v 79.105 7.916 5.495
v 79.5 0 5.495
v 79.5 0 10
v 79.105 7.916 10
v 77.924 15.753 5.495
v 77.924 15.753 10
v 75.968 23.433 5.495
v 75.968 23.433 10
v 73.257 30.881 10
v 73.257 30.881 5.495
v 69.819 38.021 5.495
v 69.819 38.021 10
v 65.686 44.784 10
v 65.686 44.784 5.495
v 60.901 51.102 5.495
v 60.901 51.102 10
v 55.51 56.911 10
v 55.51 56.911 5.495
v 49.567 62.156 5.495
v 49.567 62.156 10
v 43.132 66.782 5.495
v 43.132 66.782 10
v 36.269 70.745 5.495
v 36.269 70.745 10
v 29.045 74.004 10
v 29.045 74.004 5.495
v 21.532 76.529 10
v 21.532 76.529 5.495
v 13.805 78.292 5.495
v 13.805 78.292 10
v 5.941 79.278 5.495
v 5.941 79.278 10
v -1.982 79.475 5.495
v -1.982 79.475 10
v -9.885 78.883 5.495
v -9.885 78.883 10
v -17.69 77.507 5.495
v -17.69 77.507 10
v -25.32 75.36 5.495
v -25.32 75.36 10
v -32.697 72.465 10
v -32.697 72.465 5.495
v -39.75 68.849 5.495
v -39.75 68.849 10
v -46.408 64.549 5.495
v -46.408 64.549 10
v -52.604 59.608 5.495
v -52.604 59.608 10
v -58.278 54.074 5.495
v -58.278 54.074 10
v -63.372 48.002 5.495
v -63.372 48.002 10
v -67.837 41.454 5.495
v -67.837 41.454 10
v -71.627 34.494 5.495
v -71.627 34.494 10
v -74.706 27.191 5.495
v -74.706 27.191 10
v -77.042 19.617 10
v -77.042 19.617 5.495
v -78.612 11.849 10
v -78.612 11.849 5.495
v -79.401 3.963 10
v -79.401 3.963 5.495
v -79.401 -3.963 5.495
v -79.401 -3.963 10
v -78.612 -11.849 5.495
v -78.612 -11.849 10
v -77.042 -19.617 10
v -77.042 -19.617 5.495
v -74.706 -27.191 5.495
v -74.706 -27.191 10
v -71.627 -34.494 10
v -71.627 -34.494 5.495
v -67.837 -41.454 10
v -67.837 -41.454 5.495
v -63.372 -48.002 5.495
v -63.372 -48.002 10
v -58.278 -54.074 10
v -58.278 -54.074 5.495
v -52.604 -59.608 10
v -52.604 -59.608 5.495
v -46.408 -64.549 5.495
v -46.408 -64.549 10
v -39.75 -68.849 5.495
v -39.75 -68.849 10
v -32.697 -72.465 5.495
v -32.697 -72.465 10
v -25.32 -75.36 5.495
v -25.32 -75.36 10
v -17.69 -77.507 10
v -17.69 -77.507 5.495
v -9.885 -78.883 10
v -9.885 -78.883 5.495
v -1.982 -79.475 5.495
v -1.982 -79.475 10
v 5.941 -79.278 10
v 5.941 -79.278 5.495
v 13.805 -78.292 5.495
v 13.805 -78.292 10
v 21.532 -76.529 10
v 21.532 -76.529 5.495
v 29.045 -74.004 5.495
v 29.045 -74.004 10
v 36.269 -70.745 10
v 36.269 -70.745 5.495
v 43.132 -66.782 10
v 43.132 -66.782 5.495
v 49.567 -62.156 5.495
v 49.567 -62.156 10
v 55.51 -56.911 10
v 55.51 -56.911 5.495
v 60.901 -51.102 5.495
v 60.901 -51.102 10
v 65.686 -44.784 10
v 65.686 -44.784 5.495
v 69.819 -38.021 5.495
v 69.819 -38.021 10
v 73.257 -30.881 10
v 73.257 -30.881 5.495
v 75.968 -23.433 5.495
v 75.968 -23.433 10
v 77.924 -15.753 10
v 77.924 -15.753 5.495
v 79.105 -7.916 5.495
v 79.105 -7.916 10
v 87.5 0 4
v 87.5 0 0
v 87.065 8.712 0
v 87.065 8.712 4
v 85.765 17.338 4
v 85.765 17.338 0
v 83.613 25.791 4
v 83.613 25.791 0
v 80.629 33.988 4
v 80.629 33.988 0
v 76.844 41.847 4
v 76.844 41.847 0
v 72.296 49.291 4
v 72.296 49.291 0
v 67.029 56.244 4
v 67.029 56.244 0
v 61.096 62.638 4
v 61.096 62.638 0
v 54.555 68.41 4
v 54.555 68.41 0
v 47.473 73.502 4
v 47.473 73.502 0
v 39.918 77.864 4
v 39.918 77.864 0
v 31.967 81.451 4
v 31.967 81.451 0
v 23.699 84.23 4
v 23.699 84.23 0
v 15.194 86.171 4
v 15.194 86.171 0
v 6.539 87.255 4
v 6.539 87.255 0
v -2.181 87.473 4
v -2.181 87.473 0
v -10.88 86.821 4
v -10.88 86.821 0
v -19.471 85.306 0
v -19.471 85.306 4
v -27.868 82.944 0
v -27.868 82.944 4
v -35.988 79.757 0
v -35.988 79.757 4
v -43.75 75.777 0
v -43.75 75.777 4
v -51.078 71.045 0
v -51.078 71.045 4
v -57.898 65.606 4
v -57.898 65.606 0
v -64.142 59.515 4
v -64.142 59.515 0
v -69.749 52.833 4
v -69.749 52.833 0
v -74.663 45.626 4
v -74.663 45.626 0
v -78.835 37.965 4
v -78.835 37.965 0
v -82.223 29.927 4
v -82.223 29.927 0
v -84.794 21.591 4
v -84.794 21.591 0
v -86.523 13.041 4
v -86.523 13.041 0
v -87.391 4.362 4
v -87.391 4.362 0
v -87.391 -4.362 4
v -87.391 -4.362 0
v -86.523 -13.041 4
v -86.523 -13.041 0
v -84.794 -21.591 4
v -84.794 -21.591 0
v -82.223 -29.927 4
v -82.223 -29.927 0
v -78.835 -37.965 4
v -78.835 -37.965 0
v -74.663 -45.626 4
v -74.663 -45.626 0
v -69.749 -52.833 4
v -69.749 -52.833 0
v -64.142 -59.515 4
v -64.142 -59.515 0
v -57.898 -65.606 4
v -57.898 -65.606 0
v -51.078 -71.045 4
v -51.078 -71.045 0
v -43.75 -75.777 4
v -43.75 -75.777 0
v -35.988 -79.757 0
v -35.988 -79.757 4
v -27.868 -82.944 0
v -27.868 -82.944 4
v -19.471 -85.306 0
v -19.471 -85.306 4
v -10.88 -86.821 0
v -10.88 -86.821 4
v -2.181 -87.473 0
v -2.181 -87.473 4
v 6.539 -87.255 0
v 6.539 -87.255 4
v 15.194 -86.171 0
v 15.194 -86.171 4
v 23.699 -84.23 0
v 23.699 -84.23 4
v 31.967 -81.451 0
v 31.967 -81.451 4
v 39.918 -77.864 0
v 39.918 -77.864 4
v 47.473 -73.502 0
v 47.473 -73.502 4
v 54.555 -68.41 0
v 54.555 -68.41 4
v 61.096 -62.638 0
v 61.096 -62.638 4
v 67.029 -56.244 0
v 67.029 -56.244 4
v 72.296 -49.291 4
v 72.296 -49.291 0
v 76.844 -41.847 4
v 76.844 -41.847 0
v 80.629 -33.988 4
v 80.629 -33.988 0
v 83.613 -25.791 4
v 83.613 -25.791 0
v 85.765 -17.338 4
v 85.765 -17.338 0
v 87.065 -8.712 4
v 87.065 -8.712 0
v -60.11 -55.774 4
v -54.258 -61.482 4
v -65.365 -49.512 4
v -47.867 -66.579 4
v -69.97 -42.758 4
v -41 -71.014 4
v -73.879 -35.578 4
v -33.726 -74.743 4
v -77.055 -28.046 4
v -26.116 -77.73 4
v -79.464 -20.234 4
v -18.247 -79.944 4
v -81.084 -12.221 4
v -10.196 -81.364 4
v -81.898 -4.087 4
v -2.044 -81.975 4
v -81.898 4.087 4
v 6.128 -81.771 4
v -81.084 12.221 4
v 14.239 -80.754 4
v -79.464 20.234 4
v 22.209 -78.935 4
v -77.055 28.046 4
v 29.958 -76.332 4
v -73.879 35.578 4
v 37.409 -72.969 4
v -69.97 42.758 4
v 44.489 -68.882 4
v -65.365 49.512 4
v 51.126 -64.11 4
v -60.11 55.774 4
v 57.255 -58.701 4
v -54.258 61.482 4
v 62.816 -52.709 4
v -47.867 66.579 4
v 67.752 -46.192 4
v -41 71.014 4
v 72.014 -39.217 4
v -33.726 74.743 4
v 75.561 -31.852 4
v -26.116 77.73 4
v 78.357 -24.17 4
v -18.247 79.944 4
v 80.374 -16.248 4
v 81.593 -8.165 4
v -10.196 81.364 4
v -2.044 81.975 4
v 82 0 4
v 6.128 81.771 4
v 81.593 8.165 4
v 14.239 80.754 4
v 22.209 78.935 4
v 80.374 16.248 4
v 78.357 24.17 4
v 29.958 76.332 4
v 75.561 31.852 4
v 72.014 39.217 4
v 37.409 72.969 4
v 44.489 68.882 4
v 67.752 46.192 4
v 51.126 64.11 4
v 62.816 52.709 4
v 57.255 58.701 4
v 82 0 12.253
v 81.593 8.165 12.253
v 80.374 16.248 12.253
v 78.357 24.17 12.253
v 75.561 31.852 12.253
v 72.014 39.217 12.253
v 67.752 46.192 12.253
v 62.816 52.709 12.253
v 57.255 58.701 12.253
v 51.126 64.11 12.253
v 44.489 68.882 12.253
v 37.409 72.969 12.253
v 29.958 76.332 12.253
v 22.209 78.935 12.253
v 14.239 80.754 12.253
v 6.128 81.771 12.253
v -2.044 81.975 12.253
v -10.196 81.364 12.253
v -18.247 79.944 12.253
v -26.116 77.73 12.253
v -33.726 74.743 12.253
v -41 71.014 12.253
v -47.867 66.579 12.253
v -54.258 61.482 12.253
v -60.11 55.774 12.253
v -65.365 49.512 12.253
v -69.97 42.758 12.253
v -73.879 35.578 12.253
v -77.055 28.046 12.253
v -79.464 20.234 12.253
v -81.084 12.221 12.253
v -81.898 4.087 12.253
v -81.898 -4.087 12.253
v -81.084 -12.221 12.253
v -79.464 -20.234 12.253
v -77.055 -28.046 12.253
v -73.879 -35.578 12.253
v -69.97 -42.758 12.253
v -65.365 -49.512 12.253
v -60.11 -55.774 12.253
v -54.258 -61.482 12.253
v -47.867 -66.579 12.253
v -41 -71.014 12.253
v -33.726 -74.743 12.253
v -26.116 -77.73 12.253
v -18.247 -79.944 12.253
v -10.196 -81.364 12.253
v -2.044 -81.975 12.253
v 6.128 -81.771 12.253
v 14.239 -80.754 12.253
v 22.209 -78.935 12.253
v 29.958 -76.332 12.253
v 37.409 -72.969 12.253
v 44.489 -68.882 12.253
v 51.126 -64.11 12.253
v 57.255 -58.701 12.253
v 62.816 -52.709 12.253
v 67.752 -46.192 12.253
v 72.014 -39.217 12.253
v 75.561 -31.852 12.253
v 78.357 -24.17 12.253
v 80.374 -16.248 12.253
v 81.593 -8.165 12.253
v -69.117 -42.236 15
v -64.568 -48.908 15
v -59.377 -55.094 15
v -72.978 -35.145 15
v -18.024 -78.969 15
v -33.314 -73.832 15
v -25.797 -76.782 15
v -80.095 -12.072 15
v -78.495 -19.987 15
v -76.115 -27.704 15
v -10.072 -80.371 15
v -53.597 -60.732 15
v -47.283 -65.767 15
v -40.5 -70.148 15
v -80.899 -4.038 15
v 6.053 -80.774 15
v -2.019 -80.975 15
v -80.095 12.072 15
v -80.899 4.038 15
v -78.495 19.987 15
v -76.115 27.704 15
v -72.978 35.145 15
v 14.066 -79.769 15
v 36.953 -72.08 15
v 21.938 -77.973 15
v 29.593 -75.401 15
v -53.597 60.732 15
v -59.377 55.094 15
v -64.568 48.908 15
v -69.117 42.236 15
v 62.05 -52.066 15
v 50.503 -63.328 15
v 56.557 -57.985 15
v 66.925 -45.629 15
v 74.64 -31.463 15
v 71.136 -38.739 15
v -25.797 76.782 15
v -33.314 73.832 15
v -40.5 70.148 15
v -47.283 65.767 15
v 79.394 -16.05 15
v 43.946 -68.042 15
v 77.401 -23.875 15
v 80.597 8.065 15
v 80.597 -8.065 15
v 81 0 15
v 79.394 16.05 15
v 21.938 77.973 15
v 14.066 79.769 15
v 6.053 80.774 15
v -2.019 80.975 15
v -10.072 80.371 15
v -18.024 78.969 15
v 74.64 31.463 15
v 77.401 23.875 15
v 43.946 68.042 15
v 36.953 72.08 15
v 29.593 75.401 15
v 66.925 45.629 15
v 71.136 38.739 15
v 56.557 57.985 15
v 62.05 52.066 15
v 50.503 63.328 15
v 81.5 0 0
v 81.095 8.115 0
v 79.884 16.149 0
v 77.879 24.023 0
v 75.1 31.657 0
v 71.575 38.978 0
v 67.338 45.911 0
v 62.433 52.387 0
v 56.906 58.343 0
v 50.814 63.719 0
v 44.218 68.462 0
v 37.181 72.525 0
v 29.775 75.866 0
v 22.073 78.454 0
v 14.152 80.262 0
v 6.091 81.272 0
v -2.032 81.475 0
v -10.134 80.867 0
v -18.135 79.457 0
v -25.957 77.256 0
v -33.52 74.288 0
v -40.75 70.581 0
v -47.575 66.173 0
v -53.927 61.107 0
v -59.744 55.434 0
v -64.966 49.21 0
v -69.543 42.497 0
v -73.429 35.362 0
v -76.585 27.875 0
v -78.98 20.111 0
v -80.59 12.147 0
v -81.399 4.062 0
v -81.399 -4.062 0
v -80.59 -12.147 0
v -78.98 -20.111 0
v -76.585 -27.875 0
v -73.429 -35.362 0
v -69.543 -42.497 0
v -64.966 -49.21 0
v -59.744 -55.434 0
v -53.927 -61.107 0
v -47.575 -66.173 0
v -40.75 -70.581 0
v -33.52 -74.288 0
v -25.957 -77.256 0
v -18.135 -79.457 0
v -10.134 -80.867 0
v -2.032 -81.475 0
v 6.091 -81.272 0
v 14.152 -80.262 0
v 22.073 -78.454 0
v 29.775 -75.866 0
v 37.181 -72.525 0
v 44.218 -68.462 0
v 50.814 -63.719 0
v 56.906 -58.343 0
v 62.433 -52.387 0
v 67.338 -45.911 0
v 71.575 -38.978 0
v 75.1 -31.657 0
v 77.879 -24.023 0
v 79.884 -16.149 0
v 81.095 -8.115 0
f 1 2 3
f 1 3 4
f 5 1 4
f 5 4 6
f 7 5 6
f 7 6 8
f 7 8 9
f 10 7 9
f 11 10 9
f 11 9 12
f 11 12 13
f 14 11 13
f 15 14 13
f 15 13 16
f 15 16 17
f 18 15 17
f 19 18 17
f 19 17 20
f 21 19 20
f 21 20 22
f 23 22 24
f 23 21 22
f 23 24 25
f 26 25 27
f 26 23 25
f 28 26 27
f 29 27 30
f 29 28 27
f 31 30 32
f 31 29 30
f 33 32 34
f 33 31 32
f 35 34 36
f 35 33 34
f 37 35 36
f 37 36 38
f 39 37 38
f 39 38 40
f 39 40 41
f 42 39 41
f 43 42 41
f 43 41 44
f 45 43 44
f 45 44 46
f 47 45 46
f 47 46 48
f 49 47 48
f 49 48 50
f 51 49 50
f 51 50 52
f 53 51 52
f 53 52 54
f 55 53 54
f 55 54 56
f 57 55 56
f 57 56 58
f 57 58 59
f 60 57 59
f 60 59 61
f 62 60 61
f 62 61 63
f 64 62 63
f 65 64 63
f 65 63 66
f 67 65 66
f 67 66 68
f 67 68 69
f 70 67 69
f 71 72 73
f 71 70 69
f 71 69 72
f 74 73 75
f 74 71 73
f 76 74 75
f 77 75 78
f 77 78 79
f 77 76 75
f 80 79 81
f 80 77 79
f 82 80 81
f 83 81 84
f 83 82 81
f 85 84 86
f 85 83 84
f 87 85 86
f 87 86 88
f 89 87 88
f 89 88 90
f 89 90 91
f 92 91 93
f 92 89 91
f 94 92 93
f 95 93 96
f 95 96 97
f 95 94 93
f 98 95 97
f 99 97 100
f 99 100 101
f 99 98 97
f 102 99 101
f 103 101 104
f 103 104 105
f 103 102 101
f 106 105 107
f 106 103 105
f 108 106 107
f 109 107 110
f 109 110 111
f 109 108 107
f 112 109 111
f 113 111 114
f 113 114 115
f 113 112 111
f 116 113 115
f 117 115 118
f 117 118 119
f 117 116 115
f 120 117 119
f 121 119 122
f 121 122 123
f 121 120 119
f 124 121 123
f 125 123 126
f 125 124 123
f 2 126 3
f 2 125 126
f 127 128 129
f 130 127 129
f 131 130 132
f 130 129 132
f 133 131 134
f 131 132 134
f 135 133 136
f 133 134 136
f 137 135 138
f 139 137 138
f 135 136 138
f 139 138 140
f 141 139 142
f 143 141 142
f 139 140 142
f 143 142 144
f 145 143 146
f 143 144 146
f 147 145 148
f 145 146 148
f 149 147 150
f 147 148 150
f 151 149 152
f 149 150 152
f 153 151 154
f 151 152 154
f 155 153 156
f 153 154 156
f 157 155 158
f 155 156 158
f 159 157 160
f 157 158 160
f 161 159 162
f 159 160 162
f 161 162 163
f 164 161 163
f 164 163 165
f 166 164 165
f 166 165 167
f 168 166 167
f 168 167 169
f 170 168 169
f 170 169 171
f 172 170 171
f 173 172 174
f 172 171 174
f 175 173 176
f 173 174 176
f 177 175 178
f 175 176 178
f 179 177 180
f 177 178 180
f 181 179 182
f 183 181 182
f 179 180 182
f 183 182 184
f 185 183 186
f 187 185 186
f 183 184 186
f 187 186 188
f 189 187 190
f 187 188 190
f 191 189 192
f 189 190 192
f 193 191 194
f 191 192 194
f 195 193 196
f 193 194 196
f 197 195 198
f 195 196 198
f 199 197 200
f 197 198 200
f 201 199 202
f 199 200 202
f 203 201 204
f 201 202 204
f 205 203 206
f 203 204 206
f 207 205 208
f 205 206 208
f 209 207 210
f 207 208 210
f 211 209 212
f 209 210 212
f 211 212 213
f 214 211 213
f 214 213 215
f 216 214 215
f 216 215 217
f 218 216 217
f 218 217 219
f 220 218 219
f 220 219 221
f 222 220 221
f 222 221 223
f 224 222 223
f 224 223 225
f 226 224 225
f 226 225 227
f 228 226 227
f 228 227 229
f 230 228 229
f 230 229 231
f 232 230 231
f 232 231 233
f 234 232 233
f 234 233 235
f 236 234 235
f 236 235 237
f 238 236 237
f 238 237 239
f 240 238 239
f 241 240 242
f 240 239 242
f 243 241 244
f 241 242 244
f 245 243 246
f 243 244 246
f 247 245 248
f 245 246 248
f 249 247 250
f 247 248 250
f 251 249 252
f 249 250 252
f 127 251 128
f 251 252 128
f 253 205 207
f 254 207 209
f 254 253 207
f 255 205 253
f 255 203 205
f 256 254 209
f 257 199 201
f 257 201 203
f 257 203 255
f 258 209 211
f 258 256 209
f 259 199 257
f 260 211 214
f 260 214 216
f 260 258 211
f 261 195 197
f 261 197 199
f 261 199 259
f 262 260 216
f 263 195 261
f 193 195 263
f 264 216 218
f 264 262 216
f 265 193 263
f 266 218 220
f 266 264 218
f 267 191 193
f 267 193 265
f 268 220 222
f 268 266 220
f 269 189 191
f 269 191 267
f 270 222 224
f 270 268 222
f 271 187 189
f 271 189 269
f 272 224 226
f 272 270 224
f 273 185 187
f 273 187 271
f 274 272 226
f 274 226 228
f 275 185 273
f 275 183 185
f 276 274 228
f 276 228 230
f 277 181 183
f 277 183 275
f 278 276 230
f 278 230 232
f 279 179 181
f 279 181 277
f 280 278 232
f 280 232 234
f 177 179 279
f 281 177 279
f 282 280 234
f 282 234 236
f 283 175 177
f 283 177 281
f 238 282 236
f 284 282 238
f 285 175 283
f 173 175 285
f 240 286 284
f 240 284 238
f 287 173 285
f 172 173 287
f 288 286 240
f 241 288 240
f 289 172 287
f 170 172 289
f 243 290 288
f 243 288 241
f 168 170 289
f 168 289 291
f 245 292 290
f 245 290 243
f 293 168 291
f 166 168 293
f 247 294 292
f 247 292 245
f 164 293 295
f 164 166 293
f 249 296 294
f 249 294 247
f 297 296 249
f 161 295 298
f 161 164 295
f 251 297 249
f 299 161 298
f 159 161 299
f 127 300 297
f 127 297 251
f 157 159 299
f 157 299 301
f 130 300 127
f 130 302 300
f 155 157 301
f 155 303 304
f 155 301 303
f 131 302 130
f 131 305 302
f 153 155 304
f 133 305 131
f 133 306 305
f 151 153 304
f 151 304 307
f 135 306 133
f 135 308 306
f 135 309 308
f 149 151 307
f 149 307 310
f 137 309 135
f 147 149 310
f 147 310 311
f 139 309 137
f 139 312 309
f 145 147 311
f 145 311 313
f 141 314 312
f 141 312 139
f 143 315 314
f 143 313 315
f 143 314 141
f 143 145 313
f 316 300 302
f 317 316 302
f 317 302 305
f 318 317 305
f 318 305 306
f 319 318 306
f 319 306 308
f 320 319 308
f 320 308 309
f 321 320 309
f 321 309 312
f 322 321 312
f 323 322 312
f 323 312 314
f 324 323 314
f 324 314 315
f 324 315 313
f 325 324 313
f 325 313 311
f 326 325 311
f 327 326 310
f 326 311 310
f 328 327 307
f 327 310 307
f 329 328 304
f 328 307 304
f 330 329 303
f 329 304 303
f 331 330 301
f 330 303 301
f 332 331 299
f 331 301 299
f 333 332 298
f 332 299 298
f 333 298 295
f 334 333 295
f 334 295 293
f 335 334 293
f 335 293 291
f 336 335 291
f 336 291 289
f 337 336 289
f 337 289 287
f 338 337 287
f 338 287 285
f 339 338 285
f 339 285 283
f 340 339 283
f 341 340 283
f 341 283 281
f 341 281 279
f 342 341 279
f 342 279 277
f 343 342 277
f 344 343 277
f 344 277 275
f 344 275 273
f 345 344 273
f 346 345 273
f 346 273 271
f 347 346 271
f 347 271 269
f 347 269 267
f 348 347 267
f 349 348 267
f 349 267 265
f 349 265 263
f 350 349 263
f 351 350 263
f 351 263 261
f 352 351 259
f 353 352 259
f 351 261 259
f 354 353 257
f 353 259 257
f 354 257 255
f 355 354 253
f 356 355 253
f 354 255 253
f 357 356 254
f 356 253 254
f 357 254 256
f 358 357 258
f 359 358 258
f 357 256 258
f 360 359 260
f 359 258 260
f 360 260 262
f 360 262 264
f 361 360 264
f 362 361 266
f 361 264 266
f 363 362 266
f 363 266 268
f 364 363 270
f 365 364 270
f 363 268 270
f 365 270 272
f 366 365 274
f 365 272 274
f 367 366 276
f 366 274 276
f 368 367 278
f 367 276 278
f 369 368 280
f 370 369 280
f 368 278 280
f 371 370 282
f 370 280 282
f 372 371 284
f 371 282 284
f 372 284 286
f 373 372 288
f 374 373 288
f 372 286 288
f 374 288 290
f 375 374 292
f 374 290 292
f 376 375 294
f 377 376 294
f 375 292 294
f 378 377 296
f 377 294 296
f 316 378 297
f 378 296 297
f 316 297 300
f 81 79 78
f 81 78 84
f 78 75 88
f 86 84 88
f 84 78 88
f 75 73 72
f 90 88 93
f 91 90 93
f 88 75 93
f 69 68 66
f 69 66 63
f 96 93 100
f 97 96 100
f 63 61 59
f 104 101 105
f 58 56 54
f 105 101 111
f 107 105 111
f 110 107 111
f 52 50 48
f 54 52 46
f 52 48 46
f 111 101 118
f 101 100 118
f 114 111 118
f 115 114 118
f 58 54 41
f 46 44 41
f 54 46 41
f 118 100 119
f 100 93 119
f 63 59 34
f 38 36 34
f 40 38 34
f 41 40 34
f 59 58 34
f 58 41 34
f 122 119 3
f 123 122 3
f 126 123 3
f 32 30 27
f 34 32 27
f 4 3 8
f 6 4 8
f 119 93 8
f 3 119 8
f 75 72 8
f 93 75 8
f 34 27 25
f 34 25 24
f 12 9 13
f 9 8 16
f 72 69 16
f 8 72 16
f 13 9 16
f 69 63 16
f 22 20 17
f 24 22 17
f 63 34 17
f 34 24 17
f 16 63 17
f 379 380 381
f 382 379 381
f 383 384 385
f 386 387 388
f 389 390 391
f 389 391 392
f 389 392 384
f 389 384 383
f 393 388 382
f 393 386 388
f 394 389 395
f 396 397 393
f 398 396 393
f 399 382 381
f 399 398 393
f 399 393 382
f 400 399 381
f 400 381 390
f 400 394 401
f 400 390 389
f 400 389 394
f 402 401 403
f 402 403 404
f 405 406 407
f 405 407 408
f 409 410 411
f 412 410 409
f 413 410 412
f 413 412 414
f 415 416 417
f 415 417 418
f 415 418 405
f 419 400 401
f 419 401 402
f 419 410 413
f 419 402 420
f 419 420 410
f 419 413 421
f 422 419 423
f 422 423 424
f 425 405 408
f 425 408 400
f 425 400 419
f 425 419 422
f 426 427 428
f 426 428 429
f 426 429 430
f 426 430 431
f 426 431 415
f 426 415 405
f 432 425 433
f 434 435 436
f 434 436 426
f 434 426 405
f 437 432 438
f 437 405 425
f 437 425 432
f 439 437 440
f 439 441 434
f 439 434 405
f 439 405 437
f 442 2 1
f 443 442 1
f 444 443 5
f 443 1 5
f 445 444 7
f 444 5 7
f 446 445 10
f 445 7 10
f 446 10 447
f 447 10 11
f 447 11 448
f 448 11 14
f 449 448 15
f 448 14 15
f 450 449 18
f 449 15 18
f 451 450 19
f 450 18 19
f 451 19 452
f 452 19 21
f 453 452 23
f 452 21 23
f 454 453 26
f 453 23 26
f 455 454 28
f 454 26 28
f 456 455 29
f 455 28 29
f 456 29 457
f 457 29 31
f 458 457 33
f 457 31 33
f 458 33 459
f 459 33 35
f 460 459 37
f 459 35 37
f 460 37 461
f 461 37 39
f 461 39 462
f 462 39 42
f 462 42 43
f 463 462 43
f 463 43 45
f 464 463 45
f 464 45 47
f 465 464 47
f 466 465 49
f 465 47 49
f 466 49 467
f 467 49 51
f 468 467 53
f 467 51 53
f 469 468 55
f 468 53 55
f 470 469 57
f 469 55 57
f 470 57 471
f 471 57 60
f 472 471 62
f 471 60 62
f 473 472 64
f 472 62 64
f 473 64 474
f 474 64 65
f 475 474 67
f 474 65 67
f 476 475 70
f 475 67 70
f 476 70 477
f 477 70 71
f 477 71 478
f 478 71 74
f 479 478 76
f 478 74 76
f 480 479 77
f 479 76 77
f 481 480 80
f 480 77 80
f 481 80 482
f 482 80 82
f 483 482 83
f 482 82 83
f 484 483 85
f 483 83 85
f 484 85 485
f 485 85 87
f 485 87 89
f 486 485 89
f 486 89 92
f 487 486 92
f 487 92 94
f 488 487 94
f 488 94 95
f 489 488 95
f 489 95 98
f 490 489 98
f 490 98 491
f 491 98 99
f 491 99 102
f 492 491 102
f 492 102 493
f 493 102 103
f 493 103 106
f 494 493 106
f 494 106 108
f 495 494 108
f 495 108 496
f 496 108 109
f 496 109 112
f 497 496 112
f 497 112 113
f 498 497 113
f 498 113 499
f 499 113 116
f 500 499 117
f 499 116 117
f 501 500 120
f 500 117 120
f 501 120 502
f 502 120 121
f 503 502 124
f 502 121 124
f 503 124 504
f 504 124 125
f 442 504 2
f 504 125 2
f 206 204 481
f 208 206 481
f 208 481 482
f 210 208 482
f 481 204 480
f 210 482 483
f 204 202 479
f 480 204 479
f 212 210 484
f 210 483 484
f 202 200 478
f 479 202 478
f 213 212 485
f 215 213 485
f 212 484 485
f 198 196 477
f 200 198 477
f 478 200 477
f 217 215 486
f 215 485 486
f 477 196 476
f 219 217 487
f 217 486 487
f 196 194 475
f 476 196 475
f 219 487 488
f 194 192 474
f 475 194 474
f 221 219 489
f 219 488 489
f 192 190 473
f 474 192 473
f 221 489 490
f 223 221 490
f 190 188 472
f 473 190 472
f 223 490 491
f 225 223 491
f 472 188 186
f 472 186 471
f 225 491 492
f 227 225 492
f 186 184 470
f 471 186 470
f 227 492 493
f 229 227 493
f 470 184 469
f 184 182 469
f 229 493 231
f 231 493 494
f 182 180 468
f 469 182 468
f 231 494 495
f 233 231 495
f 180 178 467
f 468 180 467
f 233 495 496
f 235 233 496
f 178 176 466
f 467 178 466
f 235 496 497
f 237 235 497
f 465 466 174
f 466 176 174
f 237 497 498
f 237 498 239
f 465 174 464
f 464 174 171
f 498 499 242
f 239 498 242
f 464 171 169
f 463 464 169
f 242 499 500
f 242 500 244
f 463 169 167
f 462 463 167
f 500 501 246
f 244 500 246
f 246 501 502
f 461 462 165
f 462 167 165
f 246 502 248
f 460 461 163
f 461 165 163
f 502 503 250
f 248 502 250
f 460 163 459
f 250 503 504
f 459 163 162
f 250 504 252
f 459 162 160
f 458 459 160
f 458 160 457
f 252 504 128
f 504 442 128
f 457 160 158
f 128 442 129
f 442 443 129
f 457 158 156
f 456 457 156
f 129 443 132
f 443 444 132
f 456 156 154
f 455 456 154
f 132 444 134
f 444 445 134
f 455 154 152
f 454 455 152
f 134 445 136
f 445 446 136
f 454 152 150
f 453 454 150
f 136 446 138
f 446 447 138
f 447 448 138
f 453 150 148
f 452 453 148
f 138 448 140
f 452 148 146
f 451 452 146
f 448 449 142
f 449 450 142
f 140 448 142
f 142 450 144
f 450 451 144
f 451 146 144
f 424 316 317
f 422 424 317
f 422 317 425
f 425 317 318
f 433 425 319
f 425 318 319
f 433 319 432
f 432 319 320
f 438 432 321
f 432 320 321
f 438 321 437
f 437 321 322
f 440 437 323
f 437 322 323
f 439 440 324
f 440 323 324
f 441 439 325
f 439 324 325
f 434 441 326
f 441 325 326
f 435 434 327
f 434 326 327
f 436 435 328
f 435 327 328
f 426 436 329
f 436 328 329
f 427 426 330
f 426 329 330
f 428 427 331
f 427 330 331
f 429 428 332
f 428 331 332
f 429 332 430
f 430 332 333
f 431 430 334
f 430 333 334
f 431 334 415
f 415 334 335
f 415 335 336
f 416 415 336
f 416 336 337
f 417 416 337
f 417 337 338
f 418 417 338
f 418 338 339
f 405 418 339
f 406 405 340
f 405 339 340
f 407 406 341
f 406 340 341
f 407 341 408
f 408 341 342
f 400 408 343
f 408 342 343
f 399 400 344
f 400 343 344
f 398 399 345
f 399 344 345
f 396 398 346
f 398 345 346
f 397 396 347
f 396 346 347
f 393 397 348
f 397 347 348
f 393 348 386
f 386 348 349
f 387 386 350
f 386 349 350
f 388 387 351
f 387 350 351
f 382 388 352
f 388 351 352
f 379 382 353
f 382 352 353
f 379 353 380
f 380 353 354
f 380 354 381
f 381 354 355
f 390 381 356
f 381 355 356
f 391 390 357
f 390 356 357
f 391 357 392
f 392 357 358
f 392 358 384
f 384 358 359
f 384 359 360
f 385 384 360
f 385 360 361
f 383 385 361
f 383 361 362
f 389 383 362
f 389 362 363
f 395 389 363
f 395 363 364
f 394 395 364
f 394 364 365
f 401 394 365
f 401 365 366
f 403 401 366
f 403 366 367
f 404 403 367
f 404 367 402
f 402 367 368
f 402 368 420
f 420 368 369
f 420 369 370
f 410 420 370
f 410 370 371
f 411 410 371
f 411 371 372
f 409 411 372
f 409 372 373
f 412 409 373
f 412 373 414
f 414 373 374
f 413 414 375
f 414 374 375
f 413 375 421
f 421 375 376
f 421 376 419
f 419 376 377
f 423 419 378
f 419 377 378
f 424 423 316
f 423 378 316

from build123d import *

# Parameters (mm, degrees)
F1_START = 10
F0_R     = 79.5
F1_DEPTH = 5
F0_R_2   = 82
F2_DEPTH = 15
F0_R_3   = 87.5
F3_DEPTH = 4
F4_SIZE2 = 2.7474774195
F4_SIZE  = 1
F5_SIZE2 = 5.4949548389
F5_SIZE  = 2


with BuildPart() as f1:
    # F0 (on Top) → F1 (new body)
    with BuildSketch(Plane.XY.offset(F1_START)):
        Circle(F0_R)
    extrude(amount=F1_DEPTH)

    # F0 (on Top) → F2 (join)
    with BuildSketch(Plane.XY):
        Circle(F0_R_2)
        Circle(F0_R, mode=Mode.SUBTRACT)
    extrude(amount=F2_DEPTH)

    # F0 (on Top) → F3 (join)
    with BuildSketch(Plane.XY):
        Circle(F0_R_3)
        Circle(F0_R_2, mode=Mode.SUBTRACT)
    extrude(amount=F3_DEPTH)

    # F4
    f4_edges = [f1.edges().sort_by_distance(p)[0] for p in [
        (-82, 0, 15),
    ]]
    f4_side = f1.faces().sort_by_distance((0, 0, 15))[0]
    chamfer(f4_edges, length=F4_SIZE, length2=F4_SIZE2, reference=f4_side)

    # F5
    f5_edges = [f1.edges().sort_by_distance(p)[0] for p in [
        (-79.5, 0, 0),
    ]]
    f5_side = f1.faces().sort_by_distance((-81.974874, 0, 0))[0]
    chamfer(f5_edges, length=F5_SIZE, length2=F5_SIZE2, reference=f5_side)


solid = f1.part
